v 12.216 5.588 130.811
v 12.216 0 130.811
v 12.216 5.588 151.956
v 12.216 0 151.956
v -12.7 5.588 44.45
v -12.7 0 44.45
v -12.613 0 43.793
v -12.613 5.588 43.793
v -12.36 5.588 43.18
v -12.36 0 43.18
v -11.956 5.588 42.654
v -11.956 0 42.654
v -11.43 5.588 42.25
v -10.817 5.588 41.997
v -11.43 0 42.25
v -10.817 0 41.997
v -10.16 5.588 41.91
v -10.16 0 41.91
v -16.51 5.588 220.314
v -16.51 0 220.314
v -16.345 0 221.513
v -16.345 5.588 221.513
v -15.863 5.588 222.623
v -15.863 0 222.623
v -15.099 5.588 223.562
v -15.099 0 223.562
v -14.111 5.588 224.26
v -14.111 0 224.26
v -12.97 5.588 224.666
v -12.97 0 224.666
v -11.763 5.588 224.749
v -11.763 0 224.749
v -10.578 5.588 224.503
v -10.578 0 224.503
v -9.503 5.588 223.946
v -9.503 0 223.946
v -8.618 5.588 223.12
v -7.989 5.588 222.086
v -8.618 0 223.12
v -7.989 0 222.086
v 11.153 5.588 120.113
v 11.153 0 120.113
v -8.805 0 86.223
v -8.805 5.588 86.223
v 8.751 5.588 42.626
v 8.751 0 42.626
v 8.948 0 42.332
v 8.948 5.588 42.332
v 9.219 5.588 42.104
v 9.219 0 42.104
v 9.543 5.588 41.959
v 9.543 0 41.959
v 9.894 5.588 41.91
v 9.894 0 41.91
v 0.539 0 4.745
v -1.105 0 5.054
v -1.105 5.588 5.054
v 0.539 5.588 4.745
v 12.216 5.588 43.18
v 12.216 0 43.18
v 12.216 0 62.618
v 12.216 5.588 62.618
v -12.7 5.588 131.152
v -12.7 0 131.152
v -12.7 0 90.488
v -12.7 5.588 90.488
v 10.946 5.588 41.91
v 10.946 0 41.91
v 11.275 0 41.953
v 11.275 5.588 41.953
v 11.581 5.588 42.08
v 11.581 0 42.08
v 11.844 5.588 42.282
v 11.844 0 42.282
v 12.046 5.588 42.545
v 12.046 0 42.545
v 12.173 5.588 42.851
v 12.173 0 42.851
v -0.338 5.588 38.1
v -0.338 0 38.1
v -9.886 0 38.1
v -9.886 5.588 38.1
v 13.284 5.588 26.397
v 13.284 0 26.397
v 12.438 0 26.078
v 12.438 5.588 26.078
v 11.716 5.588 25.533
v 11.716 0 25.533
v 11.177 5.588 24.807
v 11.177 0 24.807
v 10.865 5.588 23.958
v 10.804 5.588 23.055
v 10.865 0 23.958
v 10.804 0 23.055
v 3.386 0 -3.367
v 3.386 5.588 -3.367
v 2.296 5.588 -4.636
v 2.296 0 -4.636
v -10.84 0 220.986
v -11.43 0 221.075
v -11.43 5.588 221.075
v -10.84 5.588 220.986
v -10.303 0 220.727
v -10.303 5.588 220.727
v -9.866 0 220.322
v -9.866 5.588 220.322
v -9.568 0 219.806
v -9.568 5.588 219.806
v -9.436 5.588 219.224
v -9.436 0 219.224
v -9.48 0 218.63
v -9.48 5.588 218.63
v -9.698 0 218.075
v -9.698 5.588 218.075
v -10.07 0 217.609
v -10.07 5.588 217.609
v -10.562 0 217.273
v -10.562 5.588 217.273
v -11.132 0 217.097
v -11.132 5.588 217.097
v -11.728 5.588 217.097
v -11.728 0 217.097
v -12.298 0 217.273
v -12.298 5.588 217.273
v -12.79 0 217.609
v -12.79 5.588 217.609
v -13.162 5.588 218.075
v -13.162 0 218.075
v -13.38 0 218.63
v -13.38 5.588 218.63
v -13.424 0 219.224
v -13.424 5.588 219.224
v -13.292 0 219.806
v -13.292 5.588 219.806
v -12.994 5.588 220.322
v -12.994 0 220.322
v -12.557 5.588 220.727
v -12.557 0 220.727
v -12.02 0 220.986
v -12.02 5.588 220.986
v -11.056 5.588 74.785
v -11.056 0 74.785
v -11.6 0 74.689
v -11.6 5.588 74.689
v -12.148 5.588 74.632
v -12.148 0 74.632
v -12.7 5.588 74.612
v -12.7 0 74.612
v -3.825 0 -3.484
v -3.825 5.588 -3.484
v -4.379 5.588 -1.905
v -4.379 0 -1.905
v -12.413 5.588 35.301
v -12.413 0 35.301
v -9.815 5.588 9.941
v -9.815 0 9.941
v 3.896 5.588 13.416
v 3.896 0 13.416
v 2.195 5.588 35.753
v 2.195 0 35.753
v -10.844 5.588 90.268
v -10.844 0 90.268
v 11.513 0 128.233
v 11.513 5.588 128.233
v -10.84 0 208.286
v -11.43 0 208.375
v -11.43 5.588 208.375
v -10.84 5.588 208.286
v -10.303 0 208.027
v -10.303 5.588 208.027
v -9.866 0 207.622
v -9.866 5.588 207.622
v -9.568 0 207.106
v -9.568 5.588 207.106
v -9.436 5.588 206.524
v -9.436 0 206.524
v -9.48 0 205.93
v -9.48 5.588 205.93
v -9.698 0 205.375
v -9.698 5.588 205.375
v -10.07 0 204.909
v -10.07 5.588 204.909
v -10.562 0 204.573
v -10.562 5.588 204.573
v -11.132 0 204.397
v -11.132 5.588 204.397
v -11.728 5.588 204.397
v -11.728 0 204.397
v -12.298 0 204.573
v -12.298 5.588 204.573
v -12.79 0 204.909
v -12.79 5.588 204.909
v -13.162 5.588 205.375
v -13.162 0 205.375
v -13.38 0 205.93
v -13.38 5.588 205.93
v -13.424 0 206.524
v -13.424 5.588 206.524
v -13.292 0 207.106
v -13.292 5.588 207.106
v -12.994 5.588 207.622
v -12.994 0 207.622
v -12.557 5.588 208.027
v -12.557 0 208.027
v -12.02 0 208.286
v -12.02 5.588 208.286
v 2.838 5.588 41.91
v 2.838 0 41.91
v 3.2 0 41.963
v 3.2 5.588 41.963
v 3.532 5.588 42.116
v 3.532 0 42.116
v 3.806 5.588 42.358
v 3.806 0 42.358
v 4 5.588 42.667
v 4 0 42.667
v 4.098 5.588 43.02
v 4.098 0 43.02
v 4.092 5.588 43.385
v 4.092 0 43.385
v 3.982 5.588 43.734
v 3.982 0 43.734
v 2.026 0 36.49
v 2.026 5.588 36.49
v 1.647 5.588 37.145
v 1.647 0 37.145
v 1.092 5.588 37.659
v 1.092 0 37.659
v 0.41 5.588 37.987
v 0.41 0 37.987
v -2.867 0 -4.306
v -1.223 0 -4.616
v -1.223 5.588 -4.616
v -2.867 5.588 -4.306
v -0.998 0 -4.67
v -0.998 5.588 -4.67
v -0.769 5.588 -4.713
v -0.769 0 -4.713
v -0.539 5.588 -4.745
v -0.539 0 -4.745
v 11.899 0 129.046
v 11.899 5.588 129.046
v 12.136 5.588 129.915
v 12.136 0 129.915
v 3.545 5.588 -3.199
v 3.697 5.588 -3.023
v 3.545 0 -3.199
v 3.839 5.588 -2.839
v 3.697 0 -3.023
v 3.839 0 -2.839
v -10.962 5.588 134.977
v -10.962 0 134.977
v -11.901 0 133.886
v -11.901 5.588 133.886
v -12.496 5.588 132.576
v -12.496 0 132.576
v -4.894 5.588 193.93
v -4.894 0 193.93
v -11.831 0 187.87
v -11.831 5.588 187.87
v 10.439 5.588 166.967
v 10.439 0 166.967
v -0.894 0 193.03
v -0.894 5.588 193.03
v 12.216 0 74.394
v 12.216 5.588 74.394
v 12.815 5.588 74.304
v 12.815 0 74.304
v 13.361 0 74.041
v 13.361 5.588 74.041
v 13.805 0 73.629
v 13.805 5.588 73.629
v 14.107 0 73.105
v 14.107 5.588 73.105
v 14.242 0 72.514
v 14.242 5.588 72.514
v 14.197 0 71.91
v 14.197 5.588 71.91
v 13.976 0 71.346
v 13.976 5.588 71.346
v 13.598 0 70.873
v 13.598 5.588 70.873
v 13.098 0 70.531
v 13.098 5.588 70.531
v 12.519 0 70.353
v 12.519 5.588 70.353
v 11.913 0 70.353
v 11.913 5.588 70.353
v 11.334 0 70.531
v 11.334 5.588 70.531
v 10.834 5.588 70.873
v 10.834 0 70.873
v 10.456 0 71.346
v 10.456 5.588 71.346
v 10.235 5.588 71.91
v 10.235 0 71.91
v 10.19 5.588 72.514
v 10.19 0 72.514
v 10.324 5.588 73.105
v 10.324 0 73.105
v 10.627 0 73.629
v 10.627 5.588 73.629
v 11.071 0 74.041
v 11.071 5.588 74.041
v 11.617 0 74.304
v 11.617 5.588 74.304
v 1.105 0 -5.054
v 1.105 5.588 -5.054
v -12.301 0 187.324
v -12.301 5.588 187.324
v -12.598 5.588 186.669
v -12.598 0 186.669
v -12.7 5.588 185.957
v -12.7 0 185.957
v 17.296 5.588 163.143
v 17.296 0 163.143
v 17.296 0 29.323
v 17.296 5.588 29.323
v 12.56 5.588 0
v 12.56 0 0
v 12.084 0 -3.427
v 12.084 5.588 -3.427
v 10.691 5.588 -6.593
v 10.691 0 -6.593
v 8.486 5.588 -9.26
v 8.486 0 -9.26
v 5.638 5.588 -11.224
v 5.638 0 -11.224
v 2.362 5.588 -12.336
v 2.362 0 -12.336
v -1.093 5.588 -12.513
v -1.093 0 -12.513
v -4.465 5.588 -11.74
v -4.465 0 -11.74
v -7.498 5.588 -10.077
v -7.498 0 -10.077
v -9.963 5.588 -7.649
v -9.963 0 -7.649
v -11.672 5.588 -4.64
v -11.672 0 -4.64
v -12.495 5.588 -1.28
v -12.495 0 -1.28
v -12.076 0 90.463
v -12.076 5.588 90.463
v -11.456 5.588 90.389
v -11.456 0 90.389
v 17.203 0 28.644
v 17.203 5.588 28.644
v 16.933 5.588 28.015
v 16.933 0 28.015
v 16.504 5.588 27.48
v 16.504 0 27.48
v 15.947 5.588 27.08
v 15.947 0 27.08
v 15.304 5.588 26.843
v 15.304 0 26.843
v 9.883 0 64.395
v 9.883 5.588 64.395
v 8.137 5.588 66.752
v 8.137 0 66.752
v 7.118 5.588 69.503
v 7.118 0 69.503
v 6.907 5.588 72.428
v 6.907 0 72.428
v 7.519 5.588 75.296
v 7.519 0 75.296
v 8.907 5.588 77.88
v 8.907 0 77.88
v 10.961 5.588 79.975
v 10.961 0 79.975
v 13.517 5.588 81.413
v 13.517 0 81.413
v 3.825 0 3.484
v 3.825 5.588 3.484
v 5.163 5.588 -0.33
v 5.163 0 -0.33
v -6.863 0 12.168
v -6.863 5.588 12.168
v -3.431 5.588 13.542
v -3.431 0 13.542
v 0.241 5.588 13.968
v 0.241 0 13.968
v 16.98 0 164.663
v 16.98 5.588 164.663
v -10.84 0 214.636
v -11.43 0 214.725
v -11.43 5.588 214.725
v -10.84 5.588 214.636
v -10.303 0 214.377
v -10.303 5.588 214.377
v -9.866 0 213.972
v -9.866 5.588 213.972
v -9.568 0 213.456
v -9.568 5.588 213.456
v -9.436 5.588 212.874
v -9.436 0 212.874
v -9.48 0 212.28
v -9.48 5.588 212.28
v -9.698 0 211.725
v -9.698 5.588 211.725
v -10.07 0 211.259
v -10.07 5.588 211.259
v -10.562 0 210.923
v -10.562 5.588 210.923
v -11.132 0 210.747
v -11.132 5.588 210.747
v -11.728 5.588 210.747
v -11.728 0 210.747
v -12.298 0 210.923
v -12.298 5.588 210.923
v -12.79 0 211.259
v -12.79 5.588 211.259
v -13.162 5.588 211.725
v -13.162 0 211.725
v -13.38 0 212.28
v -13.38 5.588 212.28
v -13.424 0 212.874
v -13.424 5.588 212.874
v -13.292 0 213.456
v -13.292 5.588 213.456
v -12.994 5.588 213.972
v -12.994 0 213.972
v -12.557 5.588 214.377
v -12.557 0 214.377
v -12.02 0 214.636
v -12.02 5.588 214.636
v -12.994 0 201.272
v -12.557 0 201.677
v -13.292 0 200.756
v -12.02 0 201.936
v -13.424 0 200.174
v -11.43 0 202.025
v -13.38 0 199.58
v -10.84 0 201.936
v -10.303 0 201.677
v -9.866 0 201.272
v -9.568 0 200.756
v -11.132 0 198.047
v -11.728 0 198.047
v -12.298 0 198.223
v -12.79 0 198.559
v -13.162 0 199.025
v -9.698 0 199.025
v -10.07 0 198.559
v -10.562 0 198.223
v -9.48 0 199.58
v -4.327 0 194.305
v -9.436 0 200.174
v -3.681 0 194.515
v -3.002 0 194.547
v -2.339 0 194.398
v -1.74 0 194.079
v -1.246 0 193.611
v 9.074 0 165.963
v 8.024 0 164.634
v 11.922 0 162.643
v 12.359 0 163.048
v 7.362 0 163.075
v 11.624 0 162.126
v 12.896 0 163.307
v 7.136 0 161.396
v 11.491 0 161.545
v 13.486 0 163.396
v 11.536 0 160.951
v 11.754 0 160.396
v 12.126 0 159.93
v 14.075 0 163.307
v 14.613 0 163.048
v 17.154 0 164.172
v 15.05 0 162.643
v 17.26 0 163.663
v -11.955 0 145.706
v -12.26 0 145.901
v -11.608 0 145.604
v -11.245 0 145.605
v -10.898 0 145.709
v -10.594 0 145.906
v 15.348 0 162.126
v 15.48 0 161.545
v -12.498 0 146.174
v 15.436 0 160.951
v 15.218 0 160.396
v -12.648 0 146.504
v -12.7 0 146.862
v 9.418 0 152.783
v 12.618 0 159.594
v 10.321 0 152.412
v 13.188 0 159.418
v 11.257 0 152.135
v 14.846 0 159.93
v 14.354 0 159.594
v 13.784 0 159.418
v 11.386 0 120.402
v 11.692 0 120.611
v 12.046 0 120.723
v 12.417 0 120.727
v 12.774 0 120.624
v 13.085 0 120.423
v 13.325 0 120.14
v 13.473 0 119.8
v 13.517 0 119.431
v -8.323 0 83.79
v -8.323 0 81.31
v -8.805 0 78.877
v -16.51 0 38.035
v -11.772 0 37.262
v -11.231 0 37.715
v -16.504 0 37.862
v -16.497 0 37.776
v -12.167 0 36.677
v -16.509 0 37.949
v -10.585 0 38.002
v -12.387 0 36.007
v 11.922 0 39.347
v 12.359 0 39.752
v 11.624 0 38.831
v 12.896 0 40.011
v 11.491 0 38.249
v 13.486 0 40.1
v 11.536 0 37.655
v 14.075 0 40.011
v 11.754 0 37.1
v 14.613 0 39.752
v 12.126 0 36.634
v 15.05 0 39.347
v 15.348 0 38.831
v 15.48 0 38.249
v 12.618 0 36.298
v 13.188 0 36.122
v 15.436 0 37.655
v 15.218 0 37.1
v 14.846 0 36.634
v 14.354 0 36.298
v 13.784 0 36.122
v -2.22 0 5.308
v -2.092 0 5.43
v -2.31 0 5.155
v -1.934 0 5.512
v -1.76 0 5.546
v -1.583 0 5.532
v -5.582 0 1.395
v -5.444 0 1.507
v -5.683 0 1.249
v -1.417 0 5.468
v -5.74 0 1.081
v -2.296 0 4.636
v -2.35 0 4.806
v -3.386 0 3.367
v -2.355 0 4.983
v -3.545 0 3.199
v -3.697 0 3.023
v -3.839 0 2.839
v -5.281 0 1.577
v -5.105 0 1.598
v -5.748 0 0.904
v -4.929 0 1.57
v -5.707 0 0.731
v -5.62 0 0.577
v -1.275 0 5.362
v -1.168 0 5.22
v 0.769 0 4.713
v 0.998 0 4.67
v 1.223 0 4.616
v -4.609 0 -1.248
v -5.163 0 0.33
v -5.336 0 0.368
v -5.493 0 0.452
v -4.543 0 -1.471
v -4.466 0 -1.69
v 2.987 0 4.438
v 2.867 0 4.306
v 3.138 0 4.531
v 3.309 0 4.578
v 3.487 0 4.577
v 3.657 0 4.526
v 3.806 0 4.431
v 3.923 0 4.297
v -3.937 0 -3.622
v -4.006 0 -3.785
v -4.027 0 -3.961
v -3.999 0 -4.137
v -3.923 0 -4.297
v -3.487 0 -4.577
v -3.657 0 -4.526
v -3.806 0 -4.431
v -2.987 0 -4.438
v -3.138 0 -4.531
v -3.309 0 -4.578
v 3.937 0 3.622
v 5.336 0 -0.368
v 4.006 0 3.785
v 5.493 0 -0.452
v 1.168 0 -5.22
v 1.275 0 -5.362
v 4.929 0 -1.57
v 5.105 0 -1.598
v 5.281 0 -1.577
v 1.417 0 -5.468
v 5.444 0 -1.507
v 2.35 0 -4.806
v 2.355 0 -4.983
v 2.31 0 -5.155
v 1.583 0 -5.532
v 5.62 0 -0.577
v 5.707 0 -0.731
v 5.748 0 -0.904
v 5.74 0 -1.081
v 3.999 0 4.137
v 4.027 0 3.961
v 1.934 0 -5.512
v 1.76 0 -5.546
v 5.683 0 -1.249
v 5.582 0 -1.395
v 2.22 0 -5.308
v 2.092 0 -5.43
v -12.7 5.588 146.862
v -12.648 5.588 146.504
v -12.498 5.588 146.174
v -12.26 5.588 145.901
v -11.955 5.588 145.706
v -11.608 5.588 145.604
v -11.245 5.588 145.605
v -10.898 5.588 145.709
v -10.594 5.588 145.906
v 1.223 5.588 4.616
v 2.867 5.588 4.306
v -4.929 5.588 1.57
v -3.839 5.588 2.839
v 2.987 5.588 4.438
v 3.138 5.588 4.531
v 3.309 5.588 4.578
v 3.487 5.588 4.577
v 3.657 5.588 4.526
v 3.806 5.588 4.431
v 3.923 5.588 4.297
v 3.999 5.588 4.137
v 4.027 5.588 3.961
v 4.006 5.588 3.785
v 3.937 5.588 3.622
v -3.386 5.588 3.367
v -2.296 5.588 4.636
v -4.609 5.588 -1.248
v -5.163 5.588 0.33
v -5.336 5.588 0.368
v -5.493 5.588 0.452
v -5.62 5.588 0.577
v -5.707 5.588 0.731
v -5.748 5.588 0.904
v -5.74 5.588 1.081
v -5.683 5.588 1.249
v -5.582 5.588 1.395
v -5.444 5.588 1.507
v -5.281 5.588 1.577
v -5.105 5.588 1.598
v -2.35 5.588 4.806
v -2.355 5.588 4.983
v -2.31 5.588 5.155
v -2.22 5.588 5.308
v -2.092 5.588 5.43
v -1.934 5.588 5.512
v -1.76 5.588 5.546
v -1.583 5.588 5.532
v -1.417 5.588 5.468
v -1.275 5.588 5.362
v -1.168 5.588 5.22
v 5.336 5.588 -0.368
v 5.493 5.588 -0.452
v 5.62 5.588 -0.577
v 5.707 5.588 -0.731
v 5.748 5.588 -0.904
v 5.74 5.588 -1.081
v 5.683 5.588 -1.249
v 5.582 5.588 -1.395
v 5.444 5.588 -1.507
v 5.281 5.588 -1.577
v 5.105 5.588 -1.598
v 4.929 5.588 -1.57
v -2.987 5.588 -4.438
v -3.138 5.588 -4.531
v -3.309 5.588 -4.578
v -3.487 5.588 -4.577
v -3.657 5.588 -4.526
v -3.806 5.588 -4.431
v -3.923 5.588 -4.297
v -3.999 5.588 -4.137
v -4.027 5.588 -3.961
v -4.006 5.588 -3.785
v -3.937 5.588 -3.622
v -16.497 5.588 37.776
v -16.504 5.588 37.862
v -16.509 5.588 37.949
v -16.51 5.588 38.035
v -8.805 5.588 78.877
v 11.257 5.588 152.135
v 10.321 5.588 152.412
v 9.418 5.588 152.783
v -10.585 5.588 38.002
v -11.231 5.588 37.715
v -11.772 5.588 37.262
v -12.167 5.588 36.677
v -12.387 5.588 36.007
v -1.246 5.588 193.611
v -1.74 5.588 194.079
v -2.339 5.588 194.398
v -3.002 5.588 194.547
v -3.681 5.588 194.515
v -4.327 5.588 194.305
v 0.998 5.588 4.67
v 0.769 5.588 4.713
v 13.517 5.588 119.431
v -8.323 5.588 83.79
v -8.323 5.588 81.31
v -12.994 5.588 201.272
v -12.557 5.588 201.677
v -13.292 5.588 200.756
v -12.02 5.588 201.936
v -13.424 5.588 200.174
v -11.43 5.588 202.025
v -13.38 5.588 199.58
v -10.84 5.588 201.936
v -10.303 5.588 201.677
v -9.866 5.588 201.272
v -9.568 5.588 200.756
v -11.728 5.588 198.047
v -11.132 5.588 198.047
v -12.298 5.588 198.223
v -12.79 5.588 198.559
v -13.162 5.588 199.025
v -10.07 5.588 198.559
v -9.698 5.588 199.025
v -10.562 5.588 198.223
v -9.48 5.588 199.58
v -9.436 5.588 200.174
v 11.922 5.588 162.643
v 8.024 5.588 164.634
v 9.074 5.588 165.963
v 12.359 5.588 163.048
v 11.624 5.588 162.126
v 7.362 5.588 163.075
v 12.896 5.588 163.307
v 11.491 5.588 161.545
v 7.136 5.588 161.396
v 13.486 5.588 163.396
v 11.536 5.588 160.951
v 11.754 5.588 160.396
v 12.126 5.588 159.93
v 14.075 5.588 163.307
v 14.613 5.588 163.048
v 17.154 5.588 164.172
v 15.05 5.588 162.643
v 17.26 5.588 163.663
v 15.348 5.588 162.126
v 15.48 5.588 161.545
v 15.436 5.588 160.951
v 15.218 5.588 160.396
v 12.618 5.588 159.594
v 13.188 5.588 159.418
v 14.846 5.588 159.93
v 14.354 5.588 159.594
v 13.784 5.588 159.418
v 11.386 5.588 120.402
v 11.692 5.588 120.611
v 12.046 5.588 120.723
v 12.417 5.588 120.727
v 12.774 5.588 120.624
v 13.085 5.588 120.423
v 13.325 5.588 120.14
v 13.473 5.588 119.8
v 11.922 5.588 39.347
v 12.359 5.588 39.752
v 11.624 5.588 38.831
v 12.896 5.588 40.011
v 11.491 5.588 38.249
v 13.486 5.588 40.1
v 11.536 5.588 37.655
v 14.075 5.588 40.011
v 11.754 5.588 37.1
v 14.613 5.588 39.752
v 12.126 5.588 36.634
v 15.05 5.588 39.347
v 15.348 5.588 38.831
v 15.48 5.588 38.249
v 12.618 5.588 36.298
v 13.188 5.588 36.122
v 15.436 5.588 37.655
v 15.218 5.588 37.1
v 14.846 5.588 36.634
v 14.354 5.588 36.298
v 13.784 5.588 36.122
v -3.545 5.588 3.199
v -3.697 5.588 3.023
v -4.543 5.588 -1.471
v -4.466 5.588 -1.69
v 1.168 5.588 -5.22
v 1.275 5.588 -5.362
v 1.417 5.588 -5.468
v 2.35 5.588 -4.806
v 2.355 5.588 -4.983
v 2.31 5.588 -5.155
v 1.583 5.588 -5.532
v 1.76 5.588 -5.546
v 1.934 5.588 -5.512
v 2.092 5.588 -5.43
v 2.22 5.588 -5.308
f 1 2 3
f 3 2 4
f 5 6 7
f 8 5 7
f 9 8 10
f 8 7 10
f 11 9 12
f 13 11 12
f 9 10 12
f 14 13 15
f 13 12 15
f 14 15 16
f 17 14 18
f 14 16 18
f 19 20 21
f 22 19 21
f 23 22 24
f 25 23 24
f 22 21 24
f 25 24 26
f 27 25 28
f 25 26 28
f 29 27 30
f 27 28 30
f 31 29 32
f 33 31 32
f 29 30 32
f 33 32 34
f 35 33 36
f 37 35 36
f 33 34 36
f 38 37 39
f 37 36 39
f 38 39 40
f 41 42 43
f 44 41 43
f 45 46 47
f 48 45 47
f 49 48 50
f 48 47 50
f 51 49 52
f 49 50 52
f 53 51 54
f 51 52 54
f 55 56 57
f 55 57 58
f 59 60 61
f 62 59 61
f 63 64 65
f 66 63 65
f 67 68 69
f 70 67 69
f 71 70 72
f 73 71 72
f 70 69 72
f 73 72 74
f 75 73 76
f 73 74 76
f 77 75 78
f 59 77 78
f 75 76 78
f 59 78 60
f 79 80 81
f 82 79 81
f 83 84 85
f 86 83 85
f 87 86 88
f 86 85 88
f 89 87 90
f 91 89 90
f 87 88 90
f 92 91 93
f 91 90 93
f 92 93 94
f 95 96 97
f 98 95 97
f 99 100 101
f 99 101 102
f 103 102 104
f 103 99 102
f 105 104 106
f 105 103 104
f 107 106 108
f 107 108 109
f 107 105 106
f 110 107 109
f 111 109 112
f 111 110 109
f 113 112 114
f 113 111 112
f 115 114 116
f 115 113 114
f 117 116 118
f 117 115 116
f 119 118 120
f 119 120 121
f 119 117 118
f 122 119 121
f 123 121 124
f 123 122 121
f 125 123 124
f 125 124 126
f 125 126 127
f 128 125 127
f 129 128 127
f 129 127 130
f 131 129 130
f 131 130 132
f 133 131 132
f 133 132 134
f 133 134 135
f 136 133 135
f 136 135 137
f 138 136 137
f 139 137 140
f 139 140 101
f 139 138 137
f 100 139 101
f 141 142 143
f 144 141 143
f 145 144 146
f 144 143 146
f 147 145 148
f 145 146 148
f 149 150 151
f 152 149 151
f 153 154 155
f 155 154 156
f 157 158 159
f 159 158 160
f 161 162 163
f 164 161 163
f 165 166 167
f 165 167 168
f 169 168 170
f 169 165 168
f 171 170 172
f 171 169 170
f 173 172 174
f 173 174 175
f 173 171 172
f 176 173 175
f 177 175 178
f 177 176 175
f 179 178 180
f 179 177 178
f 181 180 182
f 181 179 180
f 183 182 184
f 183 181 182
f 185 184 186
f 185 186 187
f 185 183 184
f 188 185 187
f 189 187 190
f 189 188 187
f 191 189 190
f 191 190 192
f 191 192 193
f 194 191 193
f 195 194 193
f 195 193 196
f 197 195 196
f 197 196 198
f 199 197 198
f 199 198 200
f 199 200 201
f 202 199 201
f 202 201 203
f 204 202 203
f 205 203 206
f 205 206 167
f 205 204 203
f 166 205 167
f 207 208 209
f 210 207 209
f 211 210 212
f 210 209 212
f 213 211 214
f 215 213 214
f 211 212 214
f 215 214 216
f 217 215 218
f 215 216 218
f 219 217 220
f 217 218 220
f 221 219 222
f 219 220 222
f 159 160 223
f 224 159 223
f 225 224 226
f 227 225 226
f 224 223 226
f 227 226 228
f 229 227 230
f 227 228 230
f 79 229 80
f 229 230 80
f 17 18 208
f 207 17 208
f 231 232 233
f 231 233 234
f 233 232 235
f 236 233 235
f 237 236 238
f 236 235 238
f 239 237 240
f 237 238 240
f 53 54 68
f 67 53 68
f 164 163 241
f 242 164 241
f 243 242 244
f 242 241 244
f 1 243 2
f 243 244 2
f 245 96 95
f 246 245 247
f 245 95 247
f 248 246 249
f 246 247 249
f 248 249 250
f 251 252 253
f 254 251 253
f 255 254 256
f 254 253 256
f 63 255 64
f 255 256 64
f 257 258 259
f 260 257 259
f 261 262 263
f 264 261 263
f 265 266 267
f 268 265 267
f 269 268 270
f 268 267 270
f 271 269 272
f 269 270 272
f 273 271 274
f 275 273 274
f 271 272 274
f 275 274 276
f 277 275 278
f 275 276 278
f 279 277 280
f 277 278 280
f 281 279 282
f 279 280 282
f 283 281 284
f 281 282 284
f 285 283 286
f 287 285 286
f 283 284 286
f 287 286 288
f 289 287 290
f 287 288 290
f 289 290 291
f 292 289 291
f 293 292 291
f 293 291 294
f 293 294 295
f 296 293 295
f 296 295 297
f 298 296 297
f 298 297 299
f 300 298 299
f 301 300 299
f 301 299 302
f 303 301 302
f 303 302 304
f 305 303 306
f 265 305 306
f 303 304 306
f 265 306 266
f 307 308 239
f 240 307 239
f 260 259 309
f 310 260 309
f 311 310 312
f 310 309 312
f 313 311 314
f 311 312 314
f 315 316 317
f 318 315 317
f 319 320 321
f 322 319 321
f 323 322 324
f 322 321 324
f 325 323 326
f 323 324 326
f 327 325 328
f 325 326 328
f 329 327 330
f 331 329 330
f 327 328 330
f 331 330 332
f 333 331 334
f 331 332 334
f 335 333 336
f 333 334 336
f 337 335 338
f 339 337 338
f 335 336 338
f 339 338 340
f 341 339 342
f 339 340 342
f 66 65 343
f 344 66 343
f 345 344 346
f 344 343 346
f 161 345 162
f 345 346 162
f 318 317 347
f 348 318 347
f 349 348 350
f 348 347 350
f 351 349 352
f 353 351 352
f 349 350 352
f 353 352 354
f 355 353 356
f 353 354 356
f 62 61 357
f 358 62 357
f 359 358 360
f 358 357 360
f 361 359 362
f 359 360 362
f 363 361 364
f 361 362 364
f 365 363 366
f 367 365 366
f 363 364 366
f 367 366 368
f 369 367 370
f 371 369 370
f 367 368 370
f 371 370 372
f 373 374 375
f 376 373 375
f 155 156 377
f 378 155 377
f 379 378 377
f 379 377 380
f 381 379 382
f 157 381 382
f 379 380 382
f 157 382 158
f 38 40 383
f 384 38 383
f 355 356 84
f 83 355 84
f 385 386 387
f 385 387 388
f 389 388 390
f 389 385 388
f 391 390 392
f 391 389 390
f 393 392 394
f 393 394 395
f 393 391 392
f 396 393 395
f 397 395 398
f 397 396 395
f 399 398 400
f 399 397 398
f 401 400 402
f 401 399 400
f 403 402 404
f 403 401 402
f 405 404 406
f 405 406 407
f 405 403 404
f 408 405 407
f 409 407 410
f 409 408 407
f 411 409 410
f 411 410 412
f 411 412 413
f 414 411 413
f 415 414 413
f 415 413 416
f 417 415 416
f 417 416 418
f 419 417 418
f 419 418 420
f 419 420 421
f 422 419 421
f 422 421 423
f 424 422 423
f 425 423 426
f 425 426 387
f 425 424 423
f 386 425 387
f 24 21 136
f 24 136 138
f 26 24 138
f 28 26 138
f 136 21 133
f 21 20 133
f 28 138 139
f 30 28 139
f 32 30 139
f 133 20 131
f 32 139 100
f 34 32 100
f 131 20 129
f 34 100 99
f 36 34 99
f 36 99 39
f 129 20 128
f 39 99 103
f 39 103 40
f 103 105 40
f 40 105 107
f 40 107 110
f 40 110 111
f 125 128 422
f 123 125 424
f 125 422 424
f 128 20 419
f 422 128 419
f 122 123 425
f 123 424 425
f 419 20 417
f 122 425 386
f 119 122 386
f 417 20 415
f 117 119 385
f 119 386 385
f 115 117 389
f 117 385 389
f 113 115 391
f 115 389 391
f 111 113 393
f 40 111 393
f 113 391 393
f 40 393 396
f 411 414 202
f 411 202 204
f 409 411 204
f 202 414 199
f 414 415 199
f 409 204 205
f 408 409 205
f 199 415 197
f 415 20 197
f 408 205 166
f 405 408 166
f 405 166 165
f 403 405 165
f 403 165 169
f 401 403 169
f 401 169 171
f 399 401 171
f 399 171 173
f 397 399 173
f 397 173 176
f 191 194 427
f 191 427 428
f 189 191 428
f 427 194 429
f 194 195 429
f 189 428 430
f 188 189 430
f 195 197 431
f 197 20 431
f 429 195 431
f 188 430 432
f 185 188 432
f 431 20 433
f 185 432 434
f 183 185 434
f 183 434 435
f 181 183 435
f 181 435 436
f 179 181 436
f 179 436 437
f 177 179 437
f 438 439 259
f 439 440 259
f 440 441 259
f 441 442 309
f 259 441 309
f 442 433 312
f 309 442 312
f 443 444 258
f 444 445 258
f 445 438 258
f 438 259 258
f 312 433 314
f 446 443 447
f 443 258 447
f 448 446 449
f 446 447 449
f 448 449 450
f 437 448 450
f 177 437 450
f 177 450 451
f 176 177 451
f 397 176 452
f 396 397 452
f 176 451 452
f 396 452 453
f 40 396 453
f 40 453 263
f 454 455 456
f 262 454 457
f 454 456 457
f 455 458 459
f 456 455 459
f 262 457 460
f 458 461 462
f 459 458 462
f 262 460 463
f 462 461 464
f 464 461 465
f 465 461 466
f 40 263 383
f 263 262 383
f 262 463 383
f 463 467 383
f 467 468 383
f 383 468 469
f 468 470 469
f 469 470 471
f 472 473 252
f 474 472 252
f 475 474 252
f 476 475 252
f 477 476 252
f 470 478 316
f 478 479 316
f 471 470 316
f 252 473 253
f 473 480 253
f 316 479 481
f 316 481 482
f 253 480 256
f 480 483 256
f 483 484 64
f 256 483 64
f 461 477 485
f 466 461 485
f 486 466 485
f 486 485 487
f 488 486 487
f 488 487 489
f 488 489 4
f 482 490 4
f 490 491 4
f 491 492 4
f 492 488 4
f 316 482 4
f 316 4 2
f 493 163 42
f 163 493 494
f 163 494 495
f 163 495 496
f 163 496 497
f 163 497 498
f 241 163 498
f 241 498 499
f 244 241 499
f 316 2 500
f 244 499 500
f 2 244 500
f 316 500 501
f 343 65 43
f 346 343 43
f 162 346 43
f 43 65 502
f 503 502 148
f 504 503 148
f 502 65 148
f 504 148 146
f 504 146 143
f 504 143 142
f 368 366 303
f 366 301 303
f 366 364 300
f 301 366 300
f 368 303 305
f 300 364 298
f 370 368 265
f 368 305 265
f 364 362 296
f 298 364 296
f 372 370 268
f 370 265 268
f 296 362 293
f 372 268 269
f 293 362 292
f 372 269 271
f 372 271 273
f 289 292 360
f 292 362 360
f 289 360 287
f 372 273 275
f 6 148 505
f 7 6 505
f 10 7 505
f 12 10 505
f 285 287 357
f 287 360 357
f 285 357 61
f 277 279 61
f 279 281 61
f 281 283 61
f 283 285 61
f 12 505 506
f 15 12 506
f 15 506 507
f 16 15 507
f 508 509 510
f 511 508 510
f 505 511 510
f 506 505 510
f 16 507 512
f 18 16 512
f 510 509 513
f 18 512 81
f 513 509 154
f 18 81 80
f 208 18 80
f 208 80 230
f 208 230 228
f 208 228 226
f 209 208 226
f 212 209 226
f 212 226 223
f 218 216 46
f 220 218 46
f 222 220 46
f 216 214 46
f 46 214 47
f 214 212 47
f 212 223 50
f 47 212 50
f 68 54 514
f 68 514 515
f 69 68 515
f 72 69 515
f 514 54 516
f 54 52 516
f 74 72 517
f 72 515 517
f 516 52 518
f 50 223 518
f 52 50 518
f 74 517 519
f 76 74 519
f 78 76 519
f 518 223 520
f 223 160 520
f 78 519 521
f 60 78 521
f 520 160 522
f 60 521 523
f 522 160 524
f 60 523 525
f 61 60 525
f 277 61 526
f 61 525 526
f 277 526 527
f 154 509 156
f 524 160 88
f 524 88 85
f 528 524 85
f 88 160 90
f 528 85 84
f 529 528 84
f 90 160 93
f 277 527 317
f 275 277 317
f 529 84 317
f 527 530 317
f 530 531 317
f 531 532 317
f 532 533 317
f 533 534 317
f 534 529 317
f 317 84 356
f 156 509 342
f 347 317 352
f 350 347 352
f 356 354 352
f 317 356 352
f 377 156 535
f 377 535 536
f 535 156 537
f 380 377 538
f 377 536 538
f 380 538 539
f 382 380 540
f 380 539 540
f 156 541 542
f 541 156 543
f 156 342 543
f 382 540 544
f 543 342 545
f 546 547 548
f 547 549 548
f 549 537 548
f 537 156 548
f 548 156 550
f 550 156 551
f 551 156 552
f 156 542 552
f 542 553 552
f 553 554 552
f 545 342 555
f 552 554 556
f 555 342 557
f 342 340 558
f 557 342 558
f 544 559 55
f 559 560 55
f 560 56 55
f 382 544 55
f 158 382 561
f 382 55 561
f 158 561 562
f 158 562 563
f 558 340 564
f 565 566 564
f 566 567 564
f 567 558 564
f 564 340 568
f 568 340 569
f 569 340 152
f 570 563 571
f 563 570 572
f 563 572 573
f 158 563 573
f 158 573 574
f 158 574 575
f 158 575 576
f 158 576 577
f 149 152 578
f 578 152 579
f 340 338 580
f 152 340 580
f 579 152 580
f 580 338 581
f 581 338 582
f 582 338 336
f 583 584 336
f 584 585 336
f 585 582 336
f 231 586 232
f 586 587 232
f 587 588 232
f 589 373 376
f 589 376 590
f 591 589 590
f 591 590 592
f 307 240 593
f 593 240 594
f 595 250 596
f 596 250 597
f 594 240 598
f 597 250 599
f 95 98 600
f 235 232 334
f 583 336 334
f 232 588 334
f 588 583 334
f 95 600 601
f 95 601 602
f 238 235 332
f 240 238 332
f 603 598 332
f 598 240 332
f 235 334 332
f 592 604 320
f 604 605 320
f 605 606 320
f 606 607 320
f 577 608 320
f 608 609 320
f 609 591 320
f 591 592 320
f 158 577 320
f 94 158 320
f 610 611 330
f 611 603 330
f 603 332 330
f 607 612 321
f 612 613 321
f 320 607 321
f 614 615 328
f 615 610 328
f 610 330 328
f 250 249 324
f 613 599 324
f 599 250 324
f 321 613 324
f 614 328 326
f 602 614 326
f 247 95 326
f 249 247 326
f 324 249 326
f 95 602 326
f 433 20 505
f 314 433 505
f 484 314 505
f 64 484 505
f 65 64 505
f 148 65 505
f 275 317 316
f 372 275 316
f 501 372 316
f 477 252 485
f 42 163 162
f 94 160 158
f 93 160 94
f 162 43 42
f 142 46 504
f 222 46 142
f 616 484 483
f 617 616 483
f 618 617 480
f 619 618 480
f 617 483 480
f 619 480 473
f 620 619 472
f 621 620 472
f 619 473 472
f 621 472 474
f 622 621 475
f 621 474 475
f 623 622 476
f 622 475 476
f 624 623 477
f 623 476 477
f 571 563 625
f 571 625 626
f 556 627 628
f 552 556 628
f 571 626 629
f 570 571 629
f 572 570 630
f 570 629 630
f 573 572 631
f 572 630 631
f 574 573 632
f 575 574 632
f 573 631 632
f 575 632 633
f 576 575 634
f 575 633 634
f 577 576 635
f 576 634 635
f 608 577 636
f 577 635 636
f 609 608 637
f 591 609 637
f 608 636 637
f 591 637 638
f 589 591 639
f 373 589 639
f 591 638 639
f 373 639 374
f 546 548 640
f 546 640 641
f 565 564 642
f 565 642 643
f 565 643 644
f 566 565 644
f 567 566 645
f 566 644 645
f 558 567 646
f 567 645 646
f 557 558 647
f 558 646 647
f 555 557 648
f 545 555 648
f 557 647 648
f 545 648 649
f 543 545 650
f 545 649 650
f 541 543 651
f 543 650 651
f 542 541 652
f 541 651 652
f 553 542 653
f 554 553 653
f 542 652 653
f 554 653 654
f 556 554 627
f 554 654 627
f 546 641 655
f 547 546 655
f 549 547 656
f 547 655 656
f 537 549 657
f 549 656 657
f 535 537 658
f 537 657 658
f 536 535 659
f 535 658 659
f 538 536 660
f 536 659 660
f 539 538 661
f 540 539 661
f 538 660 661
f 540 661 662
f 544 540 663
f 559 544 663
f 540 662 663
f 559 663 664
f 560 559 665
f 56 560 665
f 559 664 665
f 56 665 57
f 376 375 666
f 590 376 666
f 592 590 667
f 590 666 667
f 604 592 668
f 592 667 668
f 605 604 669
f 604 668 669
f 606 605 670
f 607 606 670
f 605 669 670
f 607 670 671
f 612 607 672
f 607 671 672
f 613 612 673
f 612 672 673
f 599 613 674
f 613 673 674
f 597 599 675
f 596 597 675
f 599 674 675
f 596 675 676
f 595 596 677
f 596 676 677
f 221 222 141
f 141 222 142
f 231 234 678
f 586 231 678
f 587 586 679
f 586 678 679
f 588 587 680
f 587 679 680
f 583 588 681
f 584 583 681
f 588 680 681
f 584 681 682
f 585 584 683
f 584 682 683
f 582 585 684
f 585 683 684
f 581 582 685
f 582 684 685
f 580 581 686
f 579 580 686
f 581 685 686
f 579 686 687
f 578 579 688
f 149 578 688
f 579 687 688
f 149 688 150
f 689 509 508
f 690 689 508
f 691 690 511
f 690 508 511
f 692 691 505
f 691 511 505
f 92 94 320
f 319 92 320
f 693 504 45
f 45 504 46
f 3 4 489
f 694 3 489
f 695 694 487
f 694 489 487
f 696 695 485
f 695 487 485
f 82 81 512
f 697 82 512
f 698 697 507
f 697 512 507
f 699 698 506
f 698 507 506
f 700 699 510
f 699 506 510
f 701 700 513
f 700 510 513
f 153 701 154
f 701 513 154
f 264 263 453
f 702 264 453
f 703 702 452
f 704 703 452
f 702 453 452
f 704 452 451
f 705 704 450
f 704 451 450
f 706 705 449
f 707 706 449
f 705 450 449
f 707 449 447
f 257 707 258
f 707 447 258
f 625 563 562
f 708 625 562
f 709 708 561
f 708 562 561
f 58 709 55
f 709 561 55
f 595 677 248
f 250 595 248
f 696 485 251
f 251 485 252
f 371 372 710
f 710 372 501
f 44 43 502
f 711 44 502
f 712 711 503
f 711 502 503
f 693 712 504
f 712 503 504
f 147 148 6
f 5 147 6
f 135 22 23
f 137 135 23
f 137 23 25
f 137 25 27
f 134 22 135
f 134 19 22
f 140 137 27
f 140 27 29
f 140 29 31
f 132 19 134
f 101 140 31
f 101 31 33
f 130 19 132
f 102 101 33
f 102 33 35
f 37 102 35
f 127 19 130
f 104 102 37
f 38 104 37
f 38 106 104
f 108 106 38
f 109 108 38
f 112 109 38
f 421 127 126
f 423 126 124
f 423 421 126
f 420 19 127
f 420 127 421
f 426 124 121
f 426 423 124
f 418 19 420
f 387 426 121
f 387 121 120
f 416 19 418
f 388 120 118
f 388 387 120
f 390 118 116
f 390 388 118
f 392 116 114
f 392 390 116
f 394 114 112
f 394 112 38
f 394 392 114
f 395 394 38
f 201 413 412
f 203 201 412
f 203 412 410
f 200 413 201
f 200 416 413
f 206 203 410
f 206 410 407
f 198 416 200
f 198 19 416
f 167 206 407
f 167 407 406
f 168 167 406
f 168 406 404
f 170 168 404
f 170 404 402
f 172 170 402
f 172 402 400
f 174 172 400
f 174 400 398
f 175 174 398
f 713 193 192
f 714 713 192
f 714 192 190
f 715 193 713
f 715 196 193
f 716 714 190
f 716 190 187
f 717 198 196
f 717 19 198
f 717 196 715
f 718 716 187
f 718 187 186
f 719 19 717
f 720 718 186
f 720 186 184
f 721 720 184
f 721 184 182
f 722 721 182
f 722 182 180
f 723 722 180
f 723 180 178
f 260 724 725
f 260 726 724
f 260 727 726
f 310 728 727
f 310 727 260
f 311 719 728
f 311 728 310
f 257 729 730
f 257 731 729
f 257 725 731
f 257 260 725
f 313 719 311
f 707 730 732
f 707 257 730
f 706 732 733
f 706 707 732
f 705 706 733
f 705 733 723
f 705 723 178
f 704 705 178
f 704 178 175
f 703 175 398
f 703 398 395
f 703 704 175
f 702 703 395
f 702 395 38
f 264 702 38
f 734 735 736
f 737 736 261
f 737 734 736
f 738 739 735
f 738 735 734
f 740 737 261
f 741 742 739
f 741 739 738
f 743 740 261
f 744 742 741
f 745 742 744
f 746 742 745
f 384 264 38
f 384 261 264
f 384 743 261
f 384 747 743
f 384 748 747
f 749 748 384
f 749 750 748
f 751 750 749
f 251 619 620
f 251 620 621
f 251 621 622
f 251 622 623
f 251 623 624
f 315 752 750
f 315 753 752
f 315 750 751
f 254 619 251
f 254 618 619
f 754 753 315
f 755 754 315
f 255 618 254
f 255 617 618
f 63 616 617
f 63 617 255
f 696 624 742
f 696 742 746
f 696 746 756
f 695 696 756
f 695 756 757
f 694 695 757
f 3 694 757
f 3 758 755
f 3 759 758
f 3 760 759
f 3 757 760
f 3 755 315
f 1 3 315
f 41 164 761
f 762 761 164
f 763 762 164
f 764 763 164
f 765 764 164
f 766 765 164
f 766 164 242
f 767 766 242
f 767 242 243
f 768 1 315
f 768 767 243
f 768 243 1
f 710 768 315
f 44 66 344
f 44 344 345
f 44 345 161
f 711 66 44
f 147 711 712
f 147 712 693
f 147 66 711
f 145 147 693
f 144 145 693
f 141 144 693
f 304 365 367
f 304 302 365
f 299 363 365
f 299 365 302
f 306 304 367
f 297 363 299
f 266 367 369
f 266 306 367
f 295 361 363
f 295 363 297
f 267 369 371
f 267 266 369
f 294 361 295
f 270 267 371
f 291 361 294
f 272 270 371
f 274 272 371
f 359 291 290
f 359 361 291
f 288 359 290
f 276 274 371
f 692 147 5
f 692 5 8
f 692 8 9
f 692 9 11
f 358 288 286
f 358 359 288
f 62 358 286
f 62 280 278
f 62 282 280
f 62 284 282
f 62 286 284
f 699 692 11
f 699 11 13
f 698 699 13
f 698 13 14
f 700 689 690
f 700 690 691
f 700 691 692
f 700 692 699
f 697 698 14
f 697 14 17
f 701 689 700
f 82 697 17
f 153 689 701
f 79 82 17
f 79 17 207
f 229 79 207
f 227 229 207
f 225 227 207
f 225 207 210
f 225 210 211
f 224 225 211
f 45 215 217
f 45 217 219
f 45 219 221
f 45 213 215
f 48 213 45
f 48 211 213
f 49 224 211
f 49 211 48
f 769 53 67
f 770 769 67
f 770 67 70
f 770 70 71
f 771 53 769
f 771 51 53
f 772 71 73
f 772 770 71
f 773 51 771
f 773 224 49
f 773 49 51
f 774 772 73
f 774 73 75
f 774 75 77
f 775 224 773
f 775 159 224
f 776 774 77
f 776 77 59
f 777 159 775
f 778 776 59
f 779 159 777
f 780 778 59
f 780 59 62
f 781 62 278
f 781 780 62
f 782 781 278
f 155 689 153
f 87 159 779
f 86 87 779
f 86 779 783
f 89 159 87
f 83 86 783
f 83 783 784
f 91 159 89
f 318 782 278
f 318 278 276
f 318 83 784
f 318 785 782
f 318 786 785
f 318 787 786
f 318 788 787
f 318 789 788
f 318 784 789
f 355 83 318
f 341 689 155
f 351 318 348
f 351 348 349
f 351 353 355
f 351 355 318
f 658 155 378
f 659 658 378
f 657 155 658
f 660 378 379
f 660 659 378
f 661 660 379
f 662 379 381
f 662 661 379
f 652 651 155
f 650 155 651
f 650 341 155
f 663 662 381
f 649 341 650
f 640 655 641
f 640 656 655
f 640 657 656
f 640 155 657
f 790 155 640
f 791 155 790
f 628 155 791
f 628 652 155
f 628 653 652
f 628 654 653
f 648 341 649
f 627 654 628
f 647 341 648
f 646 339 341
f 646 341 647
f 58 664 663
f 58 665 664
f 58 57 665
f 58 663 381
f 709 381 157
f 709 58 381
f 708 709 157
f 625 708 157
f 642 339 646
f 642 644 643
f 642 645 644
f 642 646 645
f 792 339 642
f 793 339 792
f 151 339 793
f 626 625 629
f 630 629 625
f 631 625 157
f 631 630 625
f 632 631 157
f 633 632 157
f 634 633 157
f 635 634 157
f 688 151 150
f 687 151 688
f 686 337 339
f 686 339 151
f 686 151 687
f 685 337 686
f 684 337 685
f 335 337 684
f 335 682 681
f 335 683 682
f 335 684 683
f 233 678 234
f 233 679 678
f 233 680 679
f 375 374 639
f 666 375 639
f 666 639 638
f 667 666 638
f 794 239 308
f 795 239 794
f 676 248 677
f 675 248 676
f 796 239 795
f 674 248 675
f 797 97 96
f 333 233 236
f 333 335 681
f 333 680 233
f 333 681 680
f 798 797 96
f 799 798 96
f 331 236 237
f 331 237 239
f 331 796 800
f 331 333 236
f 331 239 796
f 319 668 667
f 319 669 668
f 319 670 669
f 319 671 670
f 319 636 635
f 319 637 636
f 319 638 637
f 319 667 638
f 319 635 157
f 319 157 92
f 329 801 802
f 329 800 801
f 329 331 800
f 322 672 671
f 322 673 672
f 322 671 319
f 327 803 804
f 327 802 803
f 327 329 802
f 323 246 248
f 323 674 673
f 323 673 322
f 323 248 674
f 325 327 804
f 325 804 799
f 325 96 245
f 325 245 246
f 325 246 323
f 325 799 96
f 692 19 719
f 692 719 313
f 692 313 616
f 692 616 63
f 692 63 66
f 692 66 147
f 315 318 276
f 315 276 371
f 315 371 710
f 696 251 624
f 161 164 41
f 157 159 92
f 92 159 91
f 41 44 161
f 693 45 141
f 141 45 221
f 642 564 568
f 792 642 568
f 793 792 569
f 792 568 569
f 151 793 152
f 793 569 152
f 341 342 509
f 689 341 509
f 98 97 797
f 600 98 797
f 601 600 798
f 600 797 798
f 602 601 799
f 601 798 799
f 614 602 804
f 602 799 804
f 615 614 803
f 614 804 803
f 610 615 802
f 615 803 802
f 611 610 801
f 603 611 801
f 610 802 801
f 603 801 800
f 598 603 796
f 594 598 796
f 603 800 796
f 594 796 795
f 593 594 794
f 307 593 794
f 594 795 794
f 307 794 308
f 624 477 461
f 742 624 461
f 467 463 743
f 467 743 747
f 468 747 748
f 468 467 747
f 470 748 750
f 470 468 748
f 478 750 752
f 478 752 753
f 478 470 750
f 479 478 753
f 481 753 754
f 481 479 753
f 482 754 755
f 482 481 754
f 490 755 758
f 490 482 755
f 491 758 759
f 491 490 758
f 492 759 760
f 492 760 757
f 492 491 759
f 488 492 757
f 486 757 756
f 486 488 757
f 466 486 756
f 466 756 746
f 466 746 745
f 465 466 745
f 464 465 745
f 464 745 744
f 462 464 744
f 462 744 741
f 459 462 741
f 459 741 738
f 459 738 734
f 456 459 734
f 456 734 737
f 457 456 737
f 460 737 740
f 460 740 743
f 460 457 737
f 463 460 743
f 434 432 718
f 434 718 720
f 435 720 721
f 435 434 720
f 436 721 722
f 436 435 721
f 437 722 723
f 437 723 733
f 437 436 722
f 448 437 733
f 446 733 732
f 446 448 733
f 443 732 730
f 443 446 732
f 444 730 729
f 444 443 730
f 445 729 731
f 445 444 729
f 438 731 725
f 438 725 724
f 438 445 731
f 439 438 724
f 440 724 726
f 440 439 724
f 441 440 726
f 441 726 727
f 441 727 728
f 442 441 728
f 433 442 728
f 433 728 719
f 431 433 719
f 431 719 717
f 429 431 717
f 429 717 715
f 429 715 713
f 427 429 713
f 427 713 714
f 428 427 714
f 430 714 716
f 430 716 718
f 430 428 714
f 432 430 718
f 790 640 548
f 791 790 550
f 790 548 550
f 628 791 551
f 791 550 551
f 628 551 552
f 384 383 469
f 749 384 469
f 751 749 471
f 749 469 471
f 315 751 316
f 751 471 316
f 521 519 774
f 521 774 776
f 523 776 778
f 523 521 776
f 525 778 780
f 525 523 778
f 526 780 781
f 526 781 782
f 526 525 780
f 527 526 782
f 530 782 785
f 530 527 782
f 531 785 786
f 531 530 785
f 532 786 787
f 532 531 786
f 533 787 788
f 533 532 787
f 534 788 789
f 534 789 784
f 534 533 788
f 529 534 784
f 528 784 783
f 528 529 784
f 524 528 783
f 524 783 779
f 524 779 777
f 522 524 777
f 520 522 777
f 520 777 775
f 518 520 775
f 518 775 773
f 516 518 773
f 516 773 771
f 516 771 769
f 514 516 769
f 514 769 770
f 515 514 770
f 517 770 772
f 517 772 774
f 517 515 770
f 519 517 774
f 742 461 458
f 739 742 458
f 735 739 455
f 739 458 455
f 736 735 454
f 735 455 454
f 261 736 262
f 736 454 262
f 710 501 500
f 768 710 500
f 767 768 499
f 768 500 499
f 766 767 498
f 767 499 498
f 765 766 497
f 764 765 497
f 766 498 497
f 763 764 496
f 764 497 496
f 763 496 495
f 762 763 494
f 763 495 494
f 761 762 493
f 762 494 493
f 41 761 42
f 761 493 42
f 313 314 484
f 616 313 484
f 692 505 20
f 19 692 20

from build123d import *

# Parameters (mm, degrees)
SKETCH2_R           = 2
SKETCH2_R_2         = 1.999999991
BOSS_EXTRUDE1_DEPTH = 5.588
SKETCH7_R           = 2.032
CUT_EXTRUDE1_DEPTH  = 5.588
CUT_EXTRUDE2_DEPTH  = 226.492641696


with BuildPart() as part:
    # Sketch2 → Boss-Extrude1 (new body)
    with BuildSketch(Plane(origin=(0, 0, 0), x_dir=(1, 0, 0), z_dir=(0, 1, 0))):
        with BuildLine():
            ThreePointArc((17.295902343, -29.323452593), (16.73639375, -27.733089808), (15.304363929, -26.843373987))
            Line((15.304363929, -26.843373987), (13.284423018, -26.396670406))
            ThreePointArc((13.284423018, -26.396670406), (11.420627025, -25.189010374), (10.804170553, -23.055431298))
            Line((10.804170553, -23.055431298), (12.5603, 0))
            ThreePointArc((12.5603, 0), (0.640974044, 12.543934326), (-12.49487995, 1.28027775))
            Line((-12.49487995, 1.28027775), (-16.496770465, -37.776201638))
            ThreePointArc((-16.496770465, -37.776201638), (-16.50669046, -37.90548449), (-16.51, -38.035105126))
            Line((-16.51, -38.035105126), (-16.51, -220.313887427))
            ThreePointArc((-16.51, -220.313887427), (-12.970187584, -224.665744552), (-7.988667969, -222.086327038))
            Line((-7.988667969, -222.086327038), (16.979901226, -164.662549258))
            ThreePointArc((16.979901226, -164.662549258), (17.216065593, -163.919190378), (17.295902343, -163.143315306))
            Line((17.295902343, -163.143315306), (17.295902343, -29.323452593))
        make_face()
        with Locations(Location((-11.43, -219.075, 0), (0, 0, 270))):
            Circle(SKETCH2_R, mode=Mode.SUBTRACT)
        with Locations(Location((-11.43, -212.725, 0), (0, 0, 270))):
            Circle(SKETCH2_R, mode=Mode.SUBTRACT)
        with Locations(Location((-11.43, -206.375, 0), (0, 0, 270))):
            Circle(SKETCH2_R, mode=Mode.SUBTRACT)
        with Locations(Location((-11.43, -200.025, 0), (0, 0, 270))):
            Circle(SKETCH2_R, mode=Mode.SUBTRACT)
        with BuildLine():
            ThreePointArc((7.135902343, -161.395796446), (8.023611961, -164.633987883), (10.438542905, -166.966801782))
            Line((10.438542905, -166.966801782), (-0.894016375, -193.029903785))
            ThreePointArc((-0.894016375, -193.029903785), (-2.665854515, -194.495144898), (-4.89449504, -193.929898651))
            Line((-4.89449504, -193.929898651), (-11.831146076, -187.869646091))
            ThreePointArc((-11.831146076, -187.869646091), (-12.472607947, -187.007278248), (-12.7, -185.95682859))
            Line((-12.7, -185.95682859), (-12.7, -146.861981888))
            ThreePointArc((-12.7, -146.861981888), (-11.955224829, -145.705677915), (-10.594426962, -145.905573138))
            Line((-10.594426962, -145.905573138), (7.135902343, -161.395796446))
        make_face(mode=Mode.SUBTRACT)
        with BuildLine():
            ThreePointArc((12.215902343, -151.955842791), (10.785297541, -152.261664921), (9.418398214, -152.782955151))
            Line((9.418398214, -152.782955151), (-10.962292152, -134.977225798))
            ThreePointArc((-10.962292152, -134.977225798), (-12.245215894, -133.252490112), (-12.7, -131.151590796))
            Line((-12.7, -131.151590796), (-12.7, -90.4875))
            ThreePointArc((-12.7, -90.4875), (-11.765673597, -90.432318214), (-10.844338135, -90.267540106))
            Line((-10.844338135, -90.267540106), (11.513275375, -128.23323342))
            ThreePointArc((11.513275375, -128.23323342), (12.037098881, -129.475107855), (12.215902343, -130.811024207))
            Line((12.215902343, -130.811024207), (12.215902343, -151.955842791))
        make_face(mode=Mode.SUBTRACT)
        with Locations(Location((13.485902343, -161.395796446, 0), (0, 0, 270))):
            Circle(SKETCH2_R, mode=Mode.SUBTRACT)
        with BuildLine():
            Line((-10.16, -41.91), (2.838491406, -41.91))
            ThreePointArc((2.838491406, -41.91), (3.914572403, -42.505500417), (3.981509018, -43.733543799))
            Line((3.981509018, -43.733543799), (-11.055993219, -74.784618621))
            ThreePointArc((-11.055993219, -74.784618621), (-11.873503915, -74.655646925), (-12.7, -74.6125))
            Line((-12.7, -74.6125), (-12.7, -44.45))
            ThreePointArc((-12.7, -44.45), (-11.956051224, -42.653948776), (-10.16, -41.91))
        make_face(mode=Mode.SUBTRACT)
        with BuildLine():
            ThreePointArc((-9.886442157, -38.1), (-11.771808813, -37.262055396), (-12.413212622, -35.301096512))
            Line((-12.413212622, -35.301096512), (-9.81475239, -9.941405108))
            ThreePointArc((-9.81475239, -9.941405108), (-3.431386466, -13.542026692), (3.896359547, -13.415635739))
            Line((3.896359547, -13.415635739), (2.194931831, -35.752912681))
            ThreePointArc((2.194931831, -35.752912681), (1.388767881, -37.42300808), (-0.337731726, -38.1))
            Line((-0.337731726, -38.1), (-9.886442157, -38.1))
        make_face(mode=Mode.SUBTRACT)
        with BuildLine():
            ThreePointArc((3.111707299, -3.622128204), (-4.505881672, 1.581001391), (4.69270869, 0.883753468))
            Line((4.69270869, 0.883753468), (3.111707299, -3.622128204))
        make_face(mode=Mode.SUBTRACT)
        with BuildLine():
            ThreePointArc((-8.804706991, -86.222769023), (-8.262040897, -82.55), (-8.804706991, -78.877230977))
            Line((-8.804706991, -78.877230977), (8.75092063, -42.626456201))
            ThreePointArc((8.75092063, -42.626456201), (9.219438659, -42.103919003), (9.893938242, -41.91))
            Line((9.893938242, -41.91), (10.945902343, -41.91))
            ThreePointArc((10.945902343, -41.91), (11.843927955, -42.281974388), (12.215902343, -43.18))
            Line((12.215902343, -43.18), (12.215902343, -62.618124667))
            ThreePointArc((12.215902343, -62.618124667), (6.906756389, -72.428110561), (13.516748759, -81.413145613))
            Line((13.516748759, -81.413145613), (13.516748759, -119.431411199))
            ThreePointArc((13.516748759, -119.431411199), (12.599191369, -120.688899116), (11.152950849, -120.113072943))
            Line((11.152950849, -120.113072943), (-8.804706991, -86.222769023))
        make_face(mode=Mode.SUBTRACT)
        with Locations(Location((13.485902343, -38.1, 0), (0, 0, 270))):
            Circle(SKETCH2_R_2, mode=Mode.SUBTRACT)
    extrude(amount=BOSS_EXTRUDE1_DEPTH)

    # Sketch7 → Cut-Extrude1 (cut)
    with BuildSketch(Plane(origin=(0, 5.588, 0), x_dir=(1, 0, 0), z_dir=(0, 1, 0))):
        with Locations(Location((12.215902343, -72.362149281, 0), (0, 0, 270))):
            Circle(SKETCH7_R)
    extrude(amount=-CUT_EXTRUDE1_DEPTH, mode=Mode.SUBTRACT)

    # Sketch8 → Cut-Extrude2 (cut, through all)
    with BuildSketch(Plane(origin=(0, 5.588, 0), x_dir=(1, 0, 0), z_dir=(0, 1, 0))):
        with BuildLine():
            Line((1.104680914, 5.054256967), (-2.867487033, 4.306199197))
            ThreePointArc((-2.867487033, 4.306199197), (-3.806203053, 4.430543784), (-3.824774473, 3.483810218))
            Line((-3.824774473, 3.483810218), (-5.163021415, -0.330217017))
            ThreePointArc((-5.163021415, -0.330217017), (-5.740064996, -1.080996644), (-4.929455388, -1.570446748))
            Line((-4.929455388, -1.570446748), (-2.295534382, -4.636416214))
            ThreePointArc((-2.295534382, -4.636416214), (-1.933861943, -5.511540428), (-1.104680914, -5.054256967))
            Line((-1.104680914, -5.054256967), (2.867487033, -4.306199197))
            ThreePointArc((2.867487033, -4.306199197), (3.806203053, -4.430543784), (3.824774473, -3.483810218))
            Line((3.824774473, -3.483810218), (5.163021415, 0.330217017))
            ThreePointArc((5.163021415, 0.330217017), (5.740064996, 1.080996644), (4.929455388, 1.570446748))
            Line((4.929455388, 1.570446748), (2.295534382, 4.636416214))
            ThreePointArc((2.295534382, 4.636416214), (1.933861943, 5.511540428), (1.104680914, 5.054256967))
        make_face()
    extrude(amount=-CUT_EXTRUDE2_DEPTH, mode=Mode.SUBTRACT)


solid = part.part
